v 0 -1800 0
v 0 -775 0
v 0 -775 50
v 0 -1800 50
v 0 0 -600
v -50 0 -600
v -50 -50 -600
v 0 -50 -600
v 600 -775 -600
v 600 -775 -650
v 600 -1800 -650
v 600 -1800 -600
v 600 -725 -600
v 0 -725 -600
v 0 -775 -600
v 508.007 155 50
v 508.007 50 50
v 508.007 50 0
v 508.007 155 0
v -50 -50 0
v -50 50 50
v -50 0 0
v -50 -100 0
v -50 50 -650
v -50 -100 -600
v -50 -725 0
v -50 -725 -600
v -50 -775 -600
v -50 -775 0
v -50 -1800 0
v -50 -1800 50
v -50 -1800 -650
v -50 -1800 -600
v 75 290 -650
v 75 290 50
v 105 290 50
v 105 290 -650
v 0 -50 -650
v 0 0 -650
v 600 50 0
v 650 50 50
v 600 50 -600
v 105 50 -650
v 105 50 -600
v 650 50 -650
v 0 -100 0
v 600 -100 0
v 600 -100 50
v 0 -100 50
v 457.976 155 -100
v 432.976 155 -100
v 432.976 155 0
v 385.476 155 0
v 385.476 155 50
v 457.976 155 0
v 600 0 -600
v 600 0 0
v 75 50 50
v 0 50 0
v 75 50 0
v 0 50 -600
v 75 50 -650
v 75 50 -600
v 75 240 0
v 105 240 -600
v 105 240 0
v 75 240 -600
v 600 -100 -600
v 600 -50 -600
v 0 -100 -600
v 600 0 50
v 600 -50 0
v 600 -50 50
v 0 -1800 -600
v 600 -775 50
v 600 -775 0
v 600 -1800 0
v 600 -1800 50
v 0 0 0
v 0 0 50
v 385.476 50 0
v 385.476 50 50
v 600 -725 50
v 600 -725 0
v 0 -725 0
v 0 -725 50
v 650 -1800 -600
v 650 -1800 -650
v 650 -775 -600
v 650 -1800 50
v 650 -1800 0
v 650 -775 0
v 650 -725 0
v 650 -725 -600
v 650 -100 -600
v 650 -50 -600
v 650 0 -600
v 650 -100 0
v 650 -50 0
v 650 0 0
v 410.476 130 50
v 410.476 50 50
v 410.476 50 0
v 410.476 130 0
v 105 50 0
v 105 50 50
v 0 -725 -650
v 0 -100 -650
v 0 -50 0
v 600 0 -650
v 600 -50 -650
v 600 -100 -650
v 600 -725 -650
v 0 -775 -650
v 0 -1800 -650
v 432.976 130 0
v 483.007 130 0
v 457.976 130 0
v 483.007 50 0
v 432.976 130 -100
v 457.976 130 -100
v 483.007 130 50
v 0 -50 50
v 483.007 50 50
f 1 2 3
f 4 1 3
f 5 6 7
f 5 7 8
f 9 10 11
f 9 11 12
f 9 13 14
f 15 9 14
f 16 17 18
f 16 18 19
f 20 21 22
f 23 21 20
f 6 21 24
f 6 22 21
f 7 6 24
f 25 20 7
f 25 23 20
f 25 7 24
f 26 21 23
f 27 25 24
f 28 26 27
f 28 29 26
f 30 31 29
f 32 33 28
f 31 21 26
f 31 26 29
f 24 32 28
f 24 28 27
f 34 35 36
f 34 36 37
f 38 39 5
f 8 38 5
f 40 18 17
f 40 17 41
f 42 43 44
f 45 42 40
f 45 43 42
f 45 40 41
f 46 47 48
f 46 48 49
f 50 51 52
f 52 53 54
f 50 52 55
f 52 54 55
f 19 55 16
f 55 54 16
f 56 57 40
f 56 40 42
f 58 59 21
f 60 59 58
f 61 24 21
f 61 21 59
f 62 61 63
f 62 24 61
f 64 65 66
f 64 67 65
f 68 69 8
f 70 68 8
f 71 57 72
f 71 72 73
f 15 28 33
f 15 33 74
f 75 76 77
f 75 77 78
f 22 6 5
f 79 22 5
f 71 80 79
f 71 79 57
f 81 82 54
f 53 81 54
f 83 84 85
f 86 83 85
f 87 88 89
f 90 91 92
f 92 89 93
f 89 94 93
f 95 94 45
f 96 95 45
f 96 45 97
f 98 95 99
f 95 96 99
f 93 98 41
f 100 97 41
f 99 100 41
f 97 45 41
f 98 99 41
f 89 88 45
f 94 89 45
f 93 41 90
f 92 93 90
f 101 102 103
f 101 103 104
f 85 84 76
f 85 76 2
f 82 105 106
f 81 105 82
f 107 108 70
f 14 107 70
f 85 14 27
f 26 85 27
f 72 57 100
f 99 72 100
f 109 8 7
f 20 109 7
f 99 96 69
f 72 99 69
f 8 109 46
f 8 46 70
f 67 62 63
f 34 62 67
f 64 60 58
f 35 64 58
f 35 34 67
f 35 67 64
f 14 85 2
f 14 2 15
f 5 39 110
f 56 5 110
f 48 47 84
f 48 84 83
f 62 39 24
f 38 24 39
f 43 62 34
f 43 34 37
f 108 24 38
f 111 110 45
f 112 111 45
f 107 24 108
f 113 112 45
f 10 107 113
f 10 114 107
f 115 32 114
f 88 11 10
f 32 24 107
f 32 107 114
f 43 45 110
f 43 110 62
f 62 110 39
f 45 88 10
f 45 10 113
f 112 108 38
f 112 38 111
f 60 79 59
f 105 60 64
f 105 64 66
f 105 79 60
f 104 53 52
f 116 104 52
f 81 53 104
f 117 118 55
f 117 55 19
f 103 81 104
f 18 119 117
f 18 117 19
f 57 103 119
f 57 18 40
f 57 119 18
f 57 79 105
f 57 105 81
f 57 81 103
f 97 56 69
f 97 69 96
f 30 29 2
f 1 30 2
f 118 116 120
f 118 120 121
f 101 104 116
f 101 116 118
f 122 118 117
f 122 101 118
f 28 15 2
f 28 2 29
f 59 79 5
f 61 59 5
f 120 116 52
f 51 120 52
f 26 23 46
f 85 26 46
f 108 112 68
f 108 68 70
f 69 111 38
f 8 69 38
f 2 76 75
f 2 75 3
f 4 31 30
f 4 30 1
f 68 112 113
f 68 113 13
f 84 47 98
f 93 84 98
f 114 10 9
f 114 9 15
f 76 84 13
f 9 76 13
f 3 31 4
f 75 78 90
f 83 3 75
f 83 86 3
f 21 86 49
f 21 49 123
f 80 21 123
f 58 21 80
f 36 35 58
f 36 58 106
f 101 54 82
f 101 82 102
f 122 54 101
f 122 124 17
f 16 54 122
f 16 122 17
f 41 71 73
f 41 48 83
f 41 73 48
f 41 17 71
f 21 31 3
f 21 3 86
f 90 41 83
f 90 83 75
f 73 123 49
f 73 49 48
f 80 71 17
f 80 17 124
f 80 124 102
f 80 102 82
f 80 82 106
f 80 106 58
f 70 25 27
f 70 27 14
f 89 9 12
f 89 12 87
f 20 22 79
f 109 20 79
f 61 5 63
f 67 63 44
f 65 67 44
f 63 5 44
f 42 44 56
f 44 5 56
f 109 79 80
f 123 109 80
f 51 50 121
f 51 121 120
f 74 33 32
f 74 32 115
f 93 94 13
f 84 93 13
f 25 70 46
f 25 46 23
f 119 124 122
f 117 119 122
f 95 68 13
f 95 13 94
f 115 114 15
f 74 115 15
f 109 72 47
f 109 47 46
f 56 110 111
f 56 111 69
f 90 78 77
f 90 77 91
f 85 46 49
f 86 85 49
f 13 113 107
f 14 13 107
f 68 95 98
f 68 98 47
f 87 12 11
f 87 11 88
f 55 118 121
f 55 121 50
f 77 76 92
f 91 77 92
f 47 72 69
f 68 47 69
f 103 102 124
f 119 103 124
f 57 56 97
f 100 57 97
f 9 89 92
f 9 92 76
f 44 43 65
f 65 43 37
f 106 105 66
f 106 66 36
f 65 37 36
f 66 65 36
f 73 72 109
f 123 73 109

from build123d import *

# Parameters (mm, degrees)
CROQUIS1_W              = 700
CROQUIS1_H              = 700
CROQUIS1_W_2            = 600
CROQUIS1_H_2            = 600
SALIENTE_EXTRUIR1_DEPTH = 50
CROQUIS2_W              = 50
CROQUIS2_H              = 50
SALIENTE_EXTRUIR2_DEPTH = 1800
CROQUIS3_W              = 700
CROQUIS3_H              = 700
CROQUIS3_W_2            = 600
CROQUIS3_H_2            = 600
SALIENTE_EXTRUIR3_DEPTH = 50
CROQUIS4_W              = 700
CROQUIS4_H              = 700
CROQUIS4_W_2            = 600
CROQUIS4_H_2            = 600
SALIENTE_EXTRUIR4_DEPTH = 50
CROQUIS6_W              = 122.530736156
CROQUIS6_H              = 155
CROQUIS6_W_2            = 72.530736156
CROQUIS6_H_2            = 80
SALIENTE_EXTRUIR5_DEPTH = 50
CROQUIS7_W              = 25
CROQUIS7_H              = 25
SALIENTE_EXTRUIR6_DEPTH = 100
SALIENTE_EXTRUIR7_DEPTH = 15


with BuildPart() as part:
    # Croquis1 → Saliente-Extruir1 (new body)
    with BuildSketch(Plane(origin=(0, 0, 0), x_dir=(1, 0, 0), z_dir=(0, 1, 0))):
        with Locations((300, 300)):
            Rectangle(CROQUIS1_W, CROQUIS1_H)
        with Locations((300, 300)):
            Rectangle(CROQUIS1_W_2, CROQUIS1_H_2, mode=Mode.SUBTRACT)
    extrude(amount=SALIENTE_EXTRUIR1_DEPTH)

    # Croquis2 → Saliente-Extruir2 (add)
    with BuildSketch(Plane.XZ):
        with Locations((625, 25)):
            Rectangle(CROQUIS2_W, CROQUIS2_H)
        with Locations((-25, 25)):
            Rectangle(CROQUIS2_W, CROQUIS2_H)
        with Locations((-25, -625)):
            Rectangle(CROQUIS2_W, CROQUIS2_H)
        with Locations((625, -625)):
            Rectangle(CROQUIS2_W, CROQUIS2_H)
    extrude(amount=SALIENTE_EXTRUIR2_DEPTH)

    # Croquis3 → Saliente-Extruir3 (add)
    with BuildSketch(Plane(origin=(0, -725, 0), x_dir=(-1, 0, 0), z_dir=(0, -1, 0))):
        with Locations((-300, 300)):
            Rectangle(CROQUIS3_W, CROQUIS3_H)
        with Locations((-300, 300)):
            Rectangle(CROQUIS3_W_2, CROQUIS3_H_2, mode=Mode.SUBTRACT)
    extrude(amount=SALIENTE_EXTRUIR3_DEPTH)

    # Croquis4 → Saliente-Extruir4 (add)
    with BuildSketch(Plane(origin=(0, -50, 0), x_dir=(-1, 0, 0), z_dir=(0, -1, 0))):
        with Locations((-300, 300)):
            Rectangle(CROQUIS4_W, CROQUIS4_H)
        with Locations((-300, 300)):
            Rectangle(CROQUIS4_W_2, CROQUIS4_H_2, mode=Mode.SUBTRACT)
    extrude(amount=SALIENTE_EXTRUIR4_DEPTH)

    # Croquis6 → Saliente-Extruir5 (add)
    with BuildSketch(Plane.XY.offset(50)):
        with Locations((446.741550776, 77.5)):
            Rectangle(CROQUIS6_W, CROQUIS6_H)
        with Locations((446.741550776, 90)):
            Rectangle(CROQUIS6_W_2, CROQUIS6_H_2, mode=Mode.SUBTRACT)
    extrude(amount=-SALIENTE_EXTRUIR5_DEPTH)

    # Croquis7 → Saliente-Extruir6 (add)
    with BuildSketch(Plane(origin=(0, 0, 0), x_dir=(-1, 0, 0), z_dir=(0, 0, -1))):
        with Locations((-445.476182698, 142.5)):
            Rectangle(CROQUIS7_W, CROQUIS7_H)
    extrude(amount=SALIENTE_EXTRUIR6_DEPTH)

    # Croquis9 → Saliente-Extruir7 (add, symmetric)
    with BuildSketch(Plane.ZY.offset(-90)):
        Polygon((0, 50), (50, 50), (50, 290), (-650, 290), (-650, 50), (-600, 50), (-600, 240), (0, 240), align=None)
    extrude(amount=SALIENTE_EXTRUIR7_DEPTH, both=True)


solid = part.part
